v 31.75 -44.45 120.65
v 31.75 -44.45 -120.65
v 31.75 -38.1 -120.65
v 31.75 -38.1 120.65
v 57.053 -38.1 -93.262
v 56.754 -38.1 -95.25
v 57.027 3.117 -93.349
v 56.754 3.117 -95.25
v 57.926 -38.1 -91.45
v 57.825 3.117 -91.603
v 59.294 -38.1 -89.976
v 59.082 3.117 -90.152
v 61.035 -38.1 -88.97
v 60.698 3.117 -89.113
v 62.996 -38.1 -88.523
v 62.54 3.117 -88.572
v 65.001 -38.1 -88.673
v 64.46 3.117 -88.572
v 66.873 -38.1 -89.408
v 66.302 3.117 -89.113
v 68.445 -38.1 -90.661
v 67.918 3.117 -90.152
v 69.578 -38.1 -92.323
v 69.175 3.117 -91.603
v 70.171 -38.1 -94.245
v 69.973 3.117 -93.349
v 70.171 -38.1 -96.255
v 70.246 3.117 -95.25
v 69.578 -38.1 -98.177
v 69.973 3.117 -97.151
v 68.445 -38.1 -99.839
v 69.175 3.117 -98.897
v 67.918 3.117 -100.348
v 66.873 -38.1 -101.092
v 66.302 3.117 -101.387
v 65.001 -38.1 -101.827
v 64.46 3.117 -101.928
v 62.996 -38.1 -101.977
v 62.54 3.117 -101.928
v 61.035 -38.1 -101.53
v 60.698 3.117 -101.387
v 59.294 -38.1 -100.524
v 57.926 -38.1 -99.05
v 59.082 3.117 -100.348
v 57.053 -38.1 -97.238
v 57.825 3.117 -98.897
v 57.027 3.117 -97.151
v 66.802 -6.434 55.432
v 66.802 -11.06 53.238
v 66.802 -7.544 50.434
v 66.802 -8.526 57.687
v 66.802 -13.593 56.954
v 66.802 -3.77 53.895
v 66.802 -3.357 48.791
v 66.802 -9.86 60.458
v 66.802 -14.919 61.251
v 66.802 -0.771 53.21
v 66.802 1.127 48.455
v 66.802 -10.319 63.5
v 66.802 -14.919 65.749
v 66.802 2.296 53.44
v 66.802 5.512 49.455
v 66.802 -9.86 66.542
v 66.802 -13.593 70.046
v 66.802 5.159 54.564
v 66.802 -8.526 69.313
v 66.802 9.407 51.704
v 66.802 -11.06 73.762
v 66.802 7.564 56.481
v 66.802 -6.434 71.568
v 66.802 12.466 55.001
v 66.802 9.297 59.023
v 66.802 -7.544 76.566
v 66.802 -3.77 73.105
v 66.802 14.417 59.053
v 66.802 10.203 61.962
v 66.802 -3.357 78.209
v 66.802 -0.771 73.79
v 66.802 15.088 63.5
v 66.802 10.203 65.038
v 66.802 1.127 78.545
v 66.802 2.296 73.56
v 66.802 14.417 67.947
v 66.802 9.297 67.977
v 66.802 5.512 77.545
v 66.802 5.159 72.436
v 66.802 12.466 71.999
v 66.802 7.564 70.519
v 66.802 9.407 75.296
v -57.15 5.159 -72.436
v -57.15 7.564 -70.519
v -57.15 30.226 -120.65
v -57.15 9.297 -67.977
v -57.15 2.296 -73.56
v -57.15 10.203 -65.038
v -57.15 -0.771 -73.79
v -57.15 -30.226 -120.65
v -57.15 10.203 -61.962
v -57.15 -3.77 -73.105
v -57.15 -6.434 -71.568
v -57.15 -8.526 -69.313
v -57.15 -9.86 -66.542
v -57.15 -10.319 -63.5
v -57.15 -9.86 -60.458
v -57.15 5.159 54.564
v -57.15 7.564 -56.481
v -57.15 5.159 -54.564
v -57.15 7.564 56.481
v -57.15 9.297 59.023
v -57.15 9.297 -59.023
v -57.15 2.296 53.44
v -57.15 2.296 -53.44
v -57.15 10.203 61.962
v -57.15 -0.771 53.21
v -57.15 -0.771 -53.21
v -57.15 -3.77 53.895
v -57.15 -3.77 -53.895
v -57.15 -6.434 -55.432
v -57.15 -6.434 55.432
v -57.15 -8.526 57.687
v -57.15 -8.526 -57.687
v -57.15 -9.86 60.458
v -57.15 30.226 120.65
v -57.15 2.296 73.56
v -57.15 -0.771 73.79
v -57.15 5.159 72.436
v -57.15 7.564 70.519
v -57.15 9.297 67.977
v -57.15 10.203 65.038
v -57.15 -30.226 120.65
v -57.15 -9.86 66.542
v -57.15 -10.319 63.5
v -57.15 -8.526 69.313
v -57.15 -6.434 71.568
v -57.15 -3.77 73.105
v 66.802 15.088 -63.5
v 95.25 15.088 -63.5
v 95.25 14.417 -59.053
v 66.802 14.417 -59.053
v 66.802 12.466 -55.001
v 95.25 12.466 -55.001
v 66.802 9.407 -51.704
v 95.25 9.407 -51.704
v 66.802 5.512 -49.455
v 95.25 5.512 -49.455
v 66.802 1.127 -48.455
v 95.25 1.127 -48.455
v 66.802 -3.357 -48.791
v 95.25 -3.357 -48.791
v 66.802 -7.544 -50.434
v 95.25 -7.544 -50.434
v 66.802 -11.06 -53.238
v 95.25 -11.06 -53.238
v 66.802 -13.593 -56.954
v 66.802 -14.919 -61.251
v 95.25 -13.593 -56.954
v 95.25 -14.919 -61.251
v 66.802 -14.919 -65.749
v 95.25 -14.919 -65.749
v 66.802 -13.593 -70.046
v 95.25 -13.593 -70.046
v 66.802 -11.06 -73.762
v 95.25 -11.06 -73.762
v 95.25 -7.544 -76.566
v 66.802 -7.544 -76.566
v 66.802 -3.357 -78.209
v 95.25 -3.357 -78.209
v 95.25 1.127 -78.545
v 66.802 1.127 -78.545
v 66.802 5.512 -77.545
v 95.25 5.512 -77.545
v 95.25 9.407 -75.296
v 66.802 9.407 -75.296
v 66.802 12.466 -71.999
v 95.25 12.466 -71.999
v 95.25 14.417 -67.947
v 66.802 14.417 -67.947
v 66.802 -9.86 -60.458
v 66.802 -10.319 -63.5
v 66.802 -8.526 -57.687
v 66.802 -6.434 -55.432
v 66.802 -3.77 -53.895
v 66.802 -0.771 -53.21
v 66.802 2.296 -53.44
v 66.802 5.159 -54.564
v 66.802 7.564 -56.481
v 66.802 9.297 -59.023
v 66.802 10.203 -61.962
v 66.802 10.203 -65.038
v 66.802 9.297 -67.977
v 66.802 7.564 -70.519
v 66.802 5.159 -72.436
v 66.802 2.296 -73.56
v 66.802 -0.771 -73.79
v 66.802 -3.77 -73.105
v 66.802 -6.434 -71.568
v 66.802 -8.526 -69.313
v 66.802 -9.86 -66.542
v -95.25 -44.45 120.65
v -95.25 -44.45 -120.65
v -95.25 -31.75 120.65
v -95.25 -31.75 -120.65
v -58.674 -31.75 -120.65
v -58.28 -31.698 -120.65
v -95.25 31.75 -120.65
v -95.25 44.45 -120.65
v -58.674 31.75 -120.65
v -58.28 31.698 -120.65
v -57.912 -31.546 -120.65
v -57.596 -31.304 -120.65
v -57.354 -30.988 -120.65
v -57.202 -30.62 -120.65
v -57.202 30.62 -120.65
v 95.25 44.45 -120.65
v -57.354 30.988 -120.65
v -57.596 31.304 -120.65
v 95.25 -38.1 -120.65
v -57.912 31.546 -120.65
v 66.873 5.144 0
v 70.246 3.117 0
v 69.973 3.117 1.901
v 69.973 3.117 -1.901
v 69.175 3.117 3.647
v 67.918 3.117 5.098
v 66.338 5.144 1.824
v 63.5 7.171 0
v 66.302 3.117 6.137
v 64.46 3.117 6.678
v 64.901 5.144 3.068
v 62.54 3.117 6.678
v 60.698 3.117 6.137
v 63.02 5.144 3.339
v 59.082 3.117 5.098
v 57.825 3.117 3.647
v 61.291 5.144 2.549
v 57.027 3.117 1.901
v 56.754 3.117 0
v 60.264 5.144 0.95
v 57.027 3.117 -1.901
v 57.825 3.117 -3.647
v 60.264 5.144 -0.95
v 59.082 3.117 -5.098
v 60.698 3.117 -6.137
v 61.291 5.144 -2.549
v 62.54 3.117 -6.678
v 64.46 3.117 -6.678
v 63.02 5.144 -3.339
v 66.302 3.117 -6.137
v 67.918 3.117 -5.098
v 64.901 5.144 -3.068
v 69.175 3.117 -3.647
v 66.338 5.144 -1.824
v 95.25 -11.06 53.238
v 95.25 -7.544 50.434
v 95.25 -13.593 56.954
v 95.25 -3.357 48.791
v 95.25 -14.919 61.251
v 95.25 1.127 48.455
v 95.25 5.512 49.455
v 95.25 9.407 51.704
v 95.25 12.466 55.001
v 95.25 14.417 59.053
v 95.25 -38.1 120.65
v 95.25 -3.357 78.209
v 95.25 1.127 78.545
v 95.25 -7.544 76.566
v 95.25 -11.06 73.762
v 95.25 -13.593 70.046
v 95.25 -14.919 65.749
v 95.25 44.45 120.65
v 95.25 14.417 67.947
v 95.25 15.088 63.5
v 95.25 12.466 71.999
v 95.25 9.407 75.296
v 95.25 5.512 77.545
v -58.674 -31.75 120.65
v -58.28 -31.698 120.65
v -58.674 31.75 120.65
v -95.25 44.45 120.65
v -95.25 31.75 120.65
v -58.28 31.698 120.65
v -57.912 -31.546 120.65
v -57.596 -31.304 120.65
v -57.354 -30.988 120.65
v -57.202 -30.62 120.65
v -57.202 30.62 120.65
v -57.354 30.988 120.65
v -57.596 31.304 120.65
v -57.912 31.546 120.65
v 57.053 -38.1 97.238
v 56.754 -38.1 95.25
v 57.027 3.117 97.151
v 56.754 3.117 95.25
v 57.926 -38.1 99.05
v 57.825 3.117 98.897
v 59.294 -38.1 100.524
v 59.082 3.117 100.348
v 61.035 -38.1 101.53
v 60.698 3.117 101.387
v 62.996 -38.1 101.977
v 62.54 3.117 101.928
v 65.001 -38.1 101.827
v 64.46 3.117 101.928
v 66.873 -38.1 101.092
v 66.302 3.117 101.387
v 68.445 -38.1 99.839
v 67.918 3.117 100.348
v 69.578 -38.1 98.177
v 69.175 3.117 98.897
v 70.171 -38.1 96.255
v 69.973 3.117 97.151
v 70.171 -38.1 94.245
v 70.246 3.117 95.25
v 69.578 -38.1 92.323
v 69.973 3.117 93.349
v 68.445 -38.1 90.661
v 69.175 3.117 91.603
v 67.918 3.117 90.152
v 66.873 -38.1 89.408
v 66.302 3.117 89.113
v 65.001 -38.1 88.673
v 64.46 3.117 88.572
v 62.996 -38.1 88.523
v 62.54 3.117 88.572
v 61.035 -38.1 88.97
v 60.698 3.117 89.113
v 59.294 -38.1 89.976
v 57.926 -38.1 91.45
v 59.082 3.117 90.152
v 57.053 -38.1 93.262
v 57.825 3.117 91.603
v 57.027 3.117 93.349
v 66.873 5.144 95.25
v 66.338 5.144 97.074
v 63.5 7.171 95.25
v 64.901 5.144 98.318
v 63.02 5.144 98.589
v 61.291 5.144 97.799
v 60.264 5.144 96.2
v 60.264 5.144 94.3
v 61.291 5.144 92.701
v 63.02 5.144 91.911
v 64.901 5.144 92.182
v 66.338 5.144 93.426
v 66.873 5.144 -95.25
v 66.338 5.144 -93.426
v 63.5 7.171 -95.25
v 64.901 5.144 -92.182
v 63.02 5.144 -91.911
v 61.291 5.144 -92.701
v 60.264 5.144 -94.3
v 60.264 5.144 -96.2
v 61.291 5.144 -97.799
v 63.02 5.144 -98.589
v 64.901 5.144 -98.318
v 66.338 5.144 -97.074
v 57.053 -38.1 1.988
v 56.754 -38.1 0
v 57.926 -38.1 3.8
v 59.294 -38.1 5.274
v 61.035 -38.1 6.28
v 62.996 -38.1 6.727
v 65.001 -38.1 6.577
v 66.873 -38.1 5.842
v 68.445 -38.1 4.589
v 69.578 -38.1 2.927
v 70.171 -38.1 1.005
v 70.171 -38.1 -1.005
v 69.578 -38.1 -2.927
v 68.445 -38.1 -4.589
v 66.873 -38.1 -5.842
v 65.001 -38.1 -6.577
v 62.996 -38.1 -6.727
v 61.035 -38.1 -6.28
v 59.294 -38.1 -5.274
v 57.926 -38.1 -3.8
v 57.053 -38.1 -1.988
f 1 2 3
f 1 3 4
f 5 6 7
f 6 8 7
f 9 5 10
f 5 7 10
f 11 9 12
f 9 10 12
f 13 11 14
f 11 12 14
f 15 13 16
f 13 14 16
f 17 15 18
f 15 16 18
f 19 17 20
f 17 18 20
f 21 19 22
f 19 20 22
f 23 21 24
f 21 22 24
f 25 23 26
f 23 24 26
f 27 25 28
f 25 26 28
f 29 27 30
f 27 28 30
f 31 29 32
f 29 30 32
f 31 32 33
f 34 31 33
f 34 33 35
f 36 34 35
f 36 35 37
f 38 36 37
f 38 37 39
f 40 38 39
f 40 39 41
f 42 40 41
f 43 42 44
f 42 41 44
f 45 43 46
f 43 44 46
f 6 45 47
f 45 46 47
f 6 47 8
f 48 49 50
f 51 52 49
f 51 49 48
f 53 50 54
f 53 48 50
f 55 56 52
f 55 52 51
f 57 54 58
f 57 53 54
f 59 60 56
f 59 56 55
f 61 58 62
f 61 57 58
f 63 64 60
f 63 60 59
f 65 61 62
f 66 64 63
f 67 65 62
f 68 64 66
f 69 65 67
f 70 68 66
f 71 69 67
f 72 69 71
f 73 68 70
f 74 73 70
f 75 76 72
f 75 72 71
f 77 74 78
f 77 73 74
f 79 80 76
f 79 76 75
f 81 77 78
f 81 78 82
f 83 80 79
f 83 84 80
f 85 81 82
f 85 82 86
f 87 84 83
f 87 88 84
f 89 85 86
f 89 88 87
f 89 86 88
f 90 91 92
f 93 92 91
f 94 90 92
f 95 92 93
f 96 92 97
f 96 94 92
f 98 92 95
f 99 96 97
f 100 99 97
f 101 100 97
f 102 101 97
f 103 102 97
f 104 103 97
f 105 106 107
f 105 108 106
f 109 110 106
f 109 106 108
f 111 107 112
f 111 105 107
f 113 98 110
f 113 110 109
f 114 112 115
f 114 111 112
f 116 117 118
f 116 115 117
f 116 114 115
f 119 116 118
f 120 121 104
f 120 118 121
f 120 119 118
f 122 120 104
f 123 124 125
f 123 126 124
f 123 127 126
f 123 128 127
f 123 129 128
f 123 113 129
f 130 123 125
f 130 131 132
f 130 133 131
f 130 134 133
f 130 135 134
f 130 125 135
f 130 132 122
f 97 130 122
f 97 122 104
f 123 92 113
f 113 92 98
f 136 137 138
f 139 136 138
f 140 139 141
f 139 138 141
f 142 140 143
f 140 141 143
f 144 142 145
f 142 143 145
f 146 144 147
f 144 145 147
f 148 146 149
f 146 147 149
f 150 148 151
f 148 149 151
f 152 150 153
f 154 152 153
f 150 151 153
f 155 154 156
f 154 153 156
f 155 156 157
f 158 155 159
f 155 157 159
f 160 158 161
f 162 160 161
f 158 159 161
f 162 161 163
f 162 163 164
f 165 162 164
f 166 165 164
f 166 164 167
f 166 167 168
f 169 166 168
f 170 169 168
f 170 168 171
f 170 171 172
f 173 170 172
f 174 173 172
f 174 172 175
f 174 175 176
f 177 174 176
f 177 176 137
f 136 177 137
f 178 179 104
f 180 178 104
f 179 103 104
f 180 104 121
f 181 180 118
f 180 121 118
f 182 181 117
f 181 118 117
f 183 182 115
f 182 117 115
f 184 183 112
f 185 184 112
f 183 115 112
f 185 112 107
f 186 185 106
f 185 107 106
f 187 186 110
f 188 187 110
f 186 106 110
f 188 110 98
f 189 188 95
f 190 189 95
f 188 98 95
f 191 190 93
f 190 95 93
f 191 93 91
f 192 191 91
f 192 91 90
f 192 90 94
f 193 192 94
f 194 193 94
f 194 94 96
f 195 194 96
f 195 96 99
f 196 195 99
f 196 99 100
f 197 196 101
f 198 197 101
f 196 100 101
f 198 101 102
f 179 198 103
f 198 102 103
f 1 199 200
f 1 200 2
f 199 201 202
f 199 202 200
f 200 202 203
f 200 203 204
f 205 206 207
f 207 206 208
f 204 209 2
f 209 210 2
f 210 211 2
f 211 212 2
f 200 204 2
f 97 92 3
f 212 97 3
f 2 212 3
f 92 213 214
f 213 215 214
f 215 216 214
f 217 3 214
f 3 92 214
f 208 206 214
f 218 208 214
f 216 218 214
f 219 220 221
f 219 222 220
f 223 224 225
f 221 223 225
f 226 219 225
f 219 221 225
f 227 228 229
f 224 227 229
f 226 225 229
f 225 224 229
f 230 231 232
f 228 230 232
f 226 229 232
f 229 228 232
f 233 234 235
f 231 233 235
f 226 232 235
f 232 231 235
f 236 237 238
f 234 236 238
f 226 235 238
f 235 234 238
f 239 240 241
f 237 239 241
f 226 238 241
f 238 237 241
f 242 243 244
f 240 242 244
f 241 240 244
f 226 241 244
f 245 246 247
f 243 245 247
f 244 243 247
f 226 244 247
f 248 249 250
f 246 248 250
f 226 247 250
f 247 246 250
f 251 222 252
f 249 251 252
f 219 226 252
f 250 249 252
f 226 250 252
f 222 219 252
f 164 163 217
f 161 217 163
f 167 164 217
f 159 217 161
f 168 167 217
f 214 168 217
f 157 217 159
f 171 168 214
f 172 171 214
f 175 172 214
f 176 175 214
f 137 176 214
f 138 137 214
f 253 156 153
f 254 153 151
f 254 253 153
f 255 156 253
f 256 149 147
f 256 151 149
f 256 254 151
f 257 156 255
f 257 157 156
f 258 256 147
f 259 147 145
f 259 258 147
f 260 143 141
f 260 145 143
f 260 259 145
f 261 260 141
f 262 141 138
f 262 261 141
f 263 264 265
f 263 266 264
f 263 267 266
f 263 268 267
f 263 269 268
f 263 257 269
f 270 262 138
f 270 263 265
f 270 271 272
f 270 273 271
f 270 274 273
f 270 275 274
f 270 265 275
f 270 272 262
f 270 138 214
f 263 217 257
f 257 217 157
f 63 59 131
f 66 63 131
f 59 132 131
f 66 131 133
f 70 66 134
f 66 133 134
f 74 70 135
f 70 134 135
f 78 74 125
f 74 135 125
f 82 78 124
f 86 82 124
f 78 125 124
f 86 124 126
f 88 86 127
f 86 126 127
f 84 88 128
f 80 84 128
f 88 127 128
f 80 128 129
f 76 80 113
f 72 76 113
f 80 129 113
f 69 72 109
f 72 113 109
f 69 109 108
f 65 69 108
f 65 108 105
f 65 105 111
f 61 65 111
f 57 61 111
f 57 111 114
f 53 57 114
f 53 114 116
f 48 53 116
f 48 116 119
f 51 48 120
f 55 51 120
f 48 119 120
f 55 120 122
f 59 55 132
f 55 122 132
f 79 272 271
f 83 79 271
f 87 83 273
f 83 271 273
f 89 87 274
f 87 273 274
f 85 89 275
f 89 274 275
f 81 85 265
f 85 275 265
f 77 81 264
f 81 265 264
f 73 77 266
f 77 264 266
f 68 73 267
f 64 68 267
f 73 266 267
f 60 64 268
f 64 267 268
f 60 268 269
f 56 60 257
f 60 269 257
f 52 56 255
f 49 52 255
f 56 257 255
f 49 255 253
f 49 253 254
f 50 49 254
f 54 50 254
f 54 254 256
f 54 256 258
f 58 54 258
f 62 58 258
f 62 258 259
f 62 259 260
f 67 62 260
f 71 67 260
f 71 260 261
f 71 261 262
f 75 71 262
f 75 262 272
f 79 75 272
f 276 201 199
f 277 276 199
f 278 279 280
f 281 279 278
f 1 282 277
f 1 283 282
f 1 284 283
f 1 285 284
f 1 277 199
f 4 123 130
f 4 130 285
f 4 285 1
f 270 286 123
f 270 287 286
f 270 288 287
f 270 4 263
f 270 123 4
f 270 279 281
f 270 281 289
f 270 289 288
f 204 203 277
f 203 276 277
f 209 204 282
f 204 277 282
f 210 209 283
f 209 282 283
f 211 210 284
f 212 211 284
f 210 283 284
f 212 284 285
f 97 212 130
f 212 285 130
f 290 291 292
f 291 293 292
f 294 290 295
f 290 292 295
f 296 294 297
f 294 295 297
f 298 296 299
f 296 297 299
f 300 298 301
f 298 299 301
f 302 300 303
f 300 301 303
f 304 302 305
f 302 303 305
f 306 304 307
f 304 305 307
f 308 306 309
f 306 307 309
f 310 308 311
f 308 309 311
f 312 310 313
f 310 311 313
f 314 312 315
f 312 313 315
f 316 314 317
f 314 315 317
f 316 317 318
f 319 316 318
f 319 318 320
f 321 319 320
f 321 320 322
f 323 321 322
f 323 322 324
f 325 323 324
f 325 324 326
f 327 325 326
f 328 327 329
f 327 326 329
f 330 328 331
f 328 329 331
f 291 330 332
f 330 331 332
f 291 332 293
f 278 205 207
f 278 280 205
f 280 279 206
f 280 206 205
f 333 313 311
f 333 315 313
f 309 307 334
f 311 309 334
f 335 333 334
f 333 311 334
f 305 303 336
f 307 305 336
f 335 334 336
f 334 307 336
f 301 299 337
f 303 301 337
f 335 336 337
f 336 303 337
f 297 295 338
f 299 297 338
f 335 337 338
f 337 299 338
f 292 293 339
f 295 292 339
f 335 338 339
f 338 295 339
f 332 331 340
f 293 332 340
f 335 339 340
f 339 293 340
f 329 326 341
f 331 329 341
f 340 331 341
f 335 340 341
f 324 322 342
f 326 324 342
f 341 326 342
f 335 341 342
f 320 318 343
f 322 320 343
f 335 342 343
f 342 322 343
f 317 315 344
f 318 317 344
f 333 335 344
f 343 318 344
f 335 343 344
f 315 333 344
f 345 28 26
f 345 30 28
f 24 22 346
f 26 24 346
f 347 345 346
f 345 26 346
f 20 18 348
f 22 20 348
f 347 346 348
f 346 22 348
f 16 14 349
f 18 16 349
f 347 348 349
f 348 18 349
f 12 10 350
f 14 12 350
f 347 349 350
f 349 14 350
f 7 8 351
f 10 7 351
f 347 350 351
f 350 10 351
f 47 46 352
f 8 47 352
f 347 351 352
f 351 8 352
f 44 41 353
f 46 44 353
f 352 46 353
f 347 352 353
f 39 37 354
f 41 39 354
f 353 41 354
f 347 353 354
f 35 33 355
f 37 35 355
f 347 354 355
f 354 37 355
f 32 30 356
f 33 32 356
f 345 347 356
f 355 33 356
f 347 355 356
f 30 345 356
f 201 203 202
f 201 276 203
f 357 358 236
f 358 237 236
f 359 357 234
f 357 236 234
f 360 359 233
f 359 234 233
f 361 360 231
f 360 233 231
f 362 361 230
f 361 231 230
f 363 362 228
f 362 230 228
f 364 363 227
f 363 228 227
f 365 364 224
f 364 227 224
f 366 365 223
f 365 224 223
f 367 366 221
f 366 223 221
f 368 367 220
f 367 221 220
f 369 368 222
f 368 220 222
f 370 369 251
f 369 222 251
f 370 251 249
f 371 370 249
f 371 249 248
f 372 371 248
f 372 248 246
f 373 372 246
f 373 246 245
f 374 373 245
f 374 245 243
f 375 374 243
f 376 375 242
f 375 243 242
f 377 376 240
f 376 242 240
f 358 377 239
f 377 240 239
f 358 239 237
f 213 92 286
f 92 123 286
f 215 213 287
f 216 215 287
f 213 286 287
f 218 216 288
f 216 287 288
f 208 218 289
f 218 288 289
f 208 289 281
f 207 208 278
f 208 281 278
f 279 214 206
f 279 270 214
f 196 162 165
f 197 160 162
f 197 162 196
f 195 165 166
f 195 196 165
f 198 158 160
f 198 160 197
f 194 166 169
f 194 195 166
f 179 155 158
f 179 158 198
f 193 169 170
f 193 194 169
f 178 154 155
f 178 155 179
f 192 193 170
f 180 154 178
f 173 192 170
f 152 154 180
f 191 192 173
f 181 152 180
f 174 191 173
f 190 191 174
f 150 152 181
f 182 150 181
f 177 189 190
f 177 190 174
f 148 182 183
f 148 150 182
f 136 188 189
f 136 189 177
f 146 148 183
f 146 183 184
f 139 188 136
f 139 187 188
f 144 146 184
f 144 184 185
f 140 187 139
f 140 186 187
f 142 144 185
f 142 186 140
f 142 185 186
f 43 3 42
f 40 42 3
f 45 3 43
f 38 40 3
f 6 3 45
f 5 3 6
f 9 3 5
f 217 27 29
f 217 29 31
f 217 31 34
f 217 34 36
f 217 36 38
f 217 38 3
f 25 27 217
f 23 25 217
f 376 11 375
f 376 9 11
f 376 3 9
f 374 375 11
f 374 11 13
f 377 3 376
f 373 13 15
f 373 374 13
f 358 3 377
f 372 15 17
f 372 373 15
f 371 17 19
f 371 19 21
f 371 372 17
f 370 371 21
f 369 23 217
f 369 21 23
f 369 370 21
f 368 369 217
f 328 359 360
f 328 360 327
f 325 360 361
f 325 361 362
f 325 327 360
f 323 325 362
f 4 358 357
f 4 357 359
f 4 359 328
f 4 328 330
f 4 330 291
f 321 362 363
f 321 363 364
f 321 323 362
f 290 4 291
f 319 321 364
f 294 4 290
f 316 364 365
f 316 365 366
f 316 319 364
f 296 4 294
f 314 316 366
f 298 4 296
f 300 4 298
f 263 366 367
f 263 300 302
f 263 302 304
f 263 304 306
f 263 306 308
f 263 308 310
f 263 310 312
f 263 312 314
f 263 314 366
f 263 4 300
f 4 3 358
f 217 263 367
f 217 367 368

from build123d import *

# Parameters (mm, degrees)
F1_DEPTH       = 120.65
F2_R           = 1.524
F4_D           = 20.6375
F4_CBORE_D     = 30.1752
F4_CBORE_DEPTH = 28.448
F5_W           = 63.5
F5_H           = 241.3
F6_DEPTH       = 6.35
F8_D           = 13.49248
F8_DEPTH       = 41.2172727273
F8_TIP         = 4.0535499425


# Not quite as in the source:
# - a length typed as a fraction of an inch, garbled in the dataset ("3 / 203.2 mm" for 3/8 in), is restored


with BuildPart() as f1:
    # F0 (on Top) → F1 (new body, symmetric)
    with BuildSketch(Plane.XY):
        Polygon((95.25, 44.45), (-95.25, 44.45), (-95.25, 31.75), (-57.15, 31.75), (-57.15, -31.75), (-95.25, -31.75), (-95.25, -44.45), (95.25, -44.45), align=None)
    extrude(amount=F1_DEPTH, both=True)

    # F2
    f2_edges = [f1.edges().sort_by_distance(p)[0] for p in [
        (-57.15, 31.75, 0),
        (-57.15, -31.75, 0),
    ]]
    fillet(f2_edges, radius=F2_R)

    # F4 (through all)
    with Locations(Plane.YZ.offset(95.25)):
        with Locations((0, 63.5), (0, -63.5)):
            CounterBoreHole(F4_D / 2, F4_CBORE_D / 2, F4_CBORE_DEPTH)

    # F5 (on face) → F6 (cut)
    with BuildSketch(Plane.XZ.offset(44.45)):
        with Locations((63.5, 0)):
            Rectangle(F5_W, F5_H)
    extrude(amount=-F6_DEPTH, mode=Mode.SUBTRACT)

    # F8
    with Locations(Plane.XZ.offset(38.1)):
        with Locations((63.5, 95.25), (63.5, 0), (63.5, -95.25)):
            Hole(F8_D / 2, depth=F8_DEPTH)
            with Locations((0, 0, -(F8_DEPTH + F8_TIP / 2))):  # 118° drill point
                Cone(0, F8_D / 2, F8_TIP, mode=Mode.SUBTRACT)


solid = f1.part
